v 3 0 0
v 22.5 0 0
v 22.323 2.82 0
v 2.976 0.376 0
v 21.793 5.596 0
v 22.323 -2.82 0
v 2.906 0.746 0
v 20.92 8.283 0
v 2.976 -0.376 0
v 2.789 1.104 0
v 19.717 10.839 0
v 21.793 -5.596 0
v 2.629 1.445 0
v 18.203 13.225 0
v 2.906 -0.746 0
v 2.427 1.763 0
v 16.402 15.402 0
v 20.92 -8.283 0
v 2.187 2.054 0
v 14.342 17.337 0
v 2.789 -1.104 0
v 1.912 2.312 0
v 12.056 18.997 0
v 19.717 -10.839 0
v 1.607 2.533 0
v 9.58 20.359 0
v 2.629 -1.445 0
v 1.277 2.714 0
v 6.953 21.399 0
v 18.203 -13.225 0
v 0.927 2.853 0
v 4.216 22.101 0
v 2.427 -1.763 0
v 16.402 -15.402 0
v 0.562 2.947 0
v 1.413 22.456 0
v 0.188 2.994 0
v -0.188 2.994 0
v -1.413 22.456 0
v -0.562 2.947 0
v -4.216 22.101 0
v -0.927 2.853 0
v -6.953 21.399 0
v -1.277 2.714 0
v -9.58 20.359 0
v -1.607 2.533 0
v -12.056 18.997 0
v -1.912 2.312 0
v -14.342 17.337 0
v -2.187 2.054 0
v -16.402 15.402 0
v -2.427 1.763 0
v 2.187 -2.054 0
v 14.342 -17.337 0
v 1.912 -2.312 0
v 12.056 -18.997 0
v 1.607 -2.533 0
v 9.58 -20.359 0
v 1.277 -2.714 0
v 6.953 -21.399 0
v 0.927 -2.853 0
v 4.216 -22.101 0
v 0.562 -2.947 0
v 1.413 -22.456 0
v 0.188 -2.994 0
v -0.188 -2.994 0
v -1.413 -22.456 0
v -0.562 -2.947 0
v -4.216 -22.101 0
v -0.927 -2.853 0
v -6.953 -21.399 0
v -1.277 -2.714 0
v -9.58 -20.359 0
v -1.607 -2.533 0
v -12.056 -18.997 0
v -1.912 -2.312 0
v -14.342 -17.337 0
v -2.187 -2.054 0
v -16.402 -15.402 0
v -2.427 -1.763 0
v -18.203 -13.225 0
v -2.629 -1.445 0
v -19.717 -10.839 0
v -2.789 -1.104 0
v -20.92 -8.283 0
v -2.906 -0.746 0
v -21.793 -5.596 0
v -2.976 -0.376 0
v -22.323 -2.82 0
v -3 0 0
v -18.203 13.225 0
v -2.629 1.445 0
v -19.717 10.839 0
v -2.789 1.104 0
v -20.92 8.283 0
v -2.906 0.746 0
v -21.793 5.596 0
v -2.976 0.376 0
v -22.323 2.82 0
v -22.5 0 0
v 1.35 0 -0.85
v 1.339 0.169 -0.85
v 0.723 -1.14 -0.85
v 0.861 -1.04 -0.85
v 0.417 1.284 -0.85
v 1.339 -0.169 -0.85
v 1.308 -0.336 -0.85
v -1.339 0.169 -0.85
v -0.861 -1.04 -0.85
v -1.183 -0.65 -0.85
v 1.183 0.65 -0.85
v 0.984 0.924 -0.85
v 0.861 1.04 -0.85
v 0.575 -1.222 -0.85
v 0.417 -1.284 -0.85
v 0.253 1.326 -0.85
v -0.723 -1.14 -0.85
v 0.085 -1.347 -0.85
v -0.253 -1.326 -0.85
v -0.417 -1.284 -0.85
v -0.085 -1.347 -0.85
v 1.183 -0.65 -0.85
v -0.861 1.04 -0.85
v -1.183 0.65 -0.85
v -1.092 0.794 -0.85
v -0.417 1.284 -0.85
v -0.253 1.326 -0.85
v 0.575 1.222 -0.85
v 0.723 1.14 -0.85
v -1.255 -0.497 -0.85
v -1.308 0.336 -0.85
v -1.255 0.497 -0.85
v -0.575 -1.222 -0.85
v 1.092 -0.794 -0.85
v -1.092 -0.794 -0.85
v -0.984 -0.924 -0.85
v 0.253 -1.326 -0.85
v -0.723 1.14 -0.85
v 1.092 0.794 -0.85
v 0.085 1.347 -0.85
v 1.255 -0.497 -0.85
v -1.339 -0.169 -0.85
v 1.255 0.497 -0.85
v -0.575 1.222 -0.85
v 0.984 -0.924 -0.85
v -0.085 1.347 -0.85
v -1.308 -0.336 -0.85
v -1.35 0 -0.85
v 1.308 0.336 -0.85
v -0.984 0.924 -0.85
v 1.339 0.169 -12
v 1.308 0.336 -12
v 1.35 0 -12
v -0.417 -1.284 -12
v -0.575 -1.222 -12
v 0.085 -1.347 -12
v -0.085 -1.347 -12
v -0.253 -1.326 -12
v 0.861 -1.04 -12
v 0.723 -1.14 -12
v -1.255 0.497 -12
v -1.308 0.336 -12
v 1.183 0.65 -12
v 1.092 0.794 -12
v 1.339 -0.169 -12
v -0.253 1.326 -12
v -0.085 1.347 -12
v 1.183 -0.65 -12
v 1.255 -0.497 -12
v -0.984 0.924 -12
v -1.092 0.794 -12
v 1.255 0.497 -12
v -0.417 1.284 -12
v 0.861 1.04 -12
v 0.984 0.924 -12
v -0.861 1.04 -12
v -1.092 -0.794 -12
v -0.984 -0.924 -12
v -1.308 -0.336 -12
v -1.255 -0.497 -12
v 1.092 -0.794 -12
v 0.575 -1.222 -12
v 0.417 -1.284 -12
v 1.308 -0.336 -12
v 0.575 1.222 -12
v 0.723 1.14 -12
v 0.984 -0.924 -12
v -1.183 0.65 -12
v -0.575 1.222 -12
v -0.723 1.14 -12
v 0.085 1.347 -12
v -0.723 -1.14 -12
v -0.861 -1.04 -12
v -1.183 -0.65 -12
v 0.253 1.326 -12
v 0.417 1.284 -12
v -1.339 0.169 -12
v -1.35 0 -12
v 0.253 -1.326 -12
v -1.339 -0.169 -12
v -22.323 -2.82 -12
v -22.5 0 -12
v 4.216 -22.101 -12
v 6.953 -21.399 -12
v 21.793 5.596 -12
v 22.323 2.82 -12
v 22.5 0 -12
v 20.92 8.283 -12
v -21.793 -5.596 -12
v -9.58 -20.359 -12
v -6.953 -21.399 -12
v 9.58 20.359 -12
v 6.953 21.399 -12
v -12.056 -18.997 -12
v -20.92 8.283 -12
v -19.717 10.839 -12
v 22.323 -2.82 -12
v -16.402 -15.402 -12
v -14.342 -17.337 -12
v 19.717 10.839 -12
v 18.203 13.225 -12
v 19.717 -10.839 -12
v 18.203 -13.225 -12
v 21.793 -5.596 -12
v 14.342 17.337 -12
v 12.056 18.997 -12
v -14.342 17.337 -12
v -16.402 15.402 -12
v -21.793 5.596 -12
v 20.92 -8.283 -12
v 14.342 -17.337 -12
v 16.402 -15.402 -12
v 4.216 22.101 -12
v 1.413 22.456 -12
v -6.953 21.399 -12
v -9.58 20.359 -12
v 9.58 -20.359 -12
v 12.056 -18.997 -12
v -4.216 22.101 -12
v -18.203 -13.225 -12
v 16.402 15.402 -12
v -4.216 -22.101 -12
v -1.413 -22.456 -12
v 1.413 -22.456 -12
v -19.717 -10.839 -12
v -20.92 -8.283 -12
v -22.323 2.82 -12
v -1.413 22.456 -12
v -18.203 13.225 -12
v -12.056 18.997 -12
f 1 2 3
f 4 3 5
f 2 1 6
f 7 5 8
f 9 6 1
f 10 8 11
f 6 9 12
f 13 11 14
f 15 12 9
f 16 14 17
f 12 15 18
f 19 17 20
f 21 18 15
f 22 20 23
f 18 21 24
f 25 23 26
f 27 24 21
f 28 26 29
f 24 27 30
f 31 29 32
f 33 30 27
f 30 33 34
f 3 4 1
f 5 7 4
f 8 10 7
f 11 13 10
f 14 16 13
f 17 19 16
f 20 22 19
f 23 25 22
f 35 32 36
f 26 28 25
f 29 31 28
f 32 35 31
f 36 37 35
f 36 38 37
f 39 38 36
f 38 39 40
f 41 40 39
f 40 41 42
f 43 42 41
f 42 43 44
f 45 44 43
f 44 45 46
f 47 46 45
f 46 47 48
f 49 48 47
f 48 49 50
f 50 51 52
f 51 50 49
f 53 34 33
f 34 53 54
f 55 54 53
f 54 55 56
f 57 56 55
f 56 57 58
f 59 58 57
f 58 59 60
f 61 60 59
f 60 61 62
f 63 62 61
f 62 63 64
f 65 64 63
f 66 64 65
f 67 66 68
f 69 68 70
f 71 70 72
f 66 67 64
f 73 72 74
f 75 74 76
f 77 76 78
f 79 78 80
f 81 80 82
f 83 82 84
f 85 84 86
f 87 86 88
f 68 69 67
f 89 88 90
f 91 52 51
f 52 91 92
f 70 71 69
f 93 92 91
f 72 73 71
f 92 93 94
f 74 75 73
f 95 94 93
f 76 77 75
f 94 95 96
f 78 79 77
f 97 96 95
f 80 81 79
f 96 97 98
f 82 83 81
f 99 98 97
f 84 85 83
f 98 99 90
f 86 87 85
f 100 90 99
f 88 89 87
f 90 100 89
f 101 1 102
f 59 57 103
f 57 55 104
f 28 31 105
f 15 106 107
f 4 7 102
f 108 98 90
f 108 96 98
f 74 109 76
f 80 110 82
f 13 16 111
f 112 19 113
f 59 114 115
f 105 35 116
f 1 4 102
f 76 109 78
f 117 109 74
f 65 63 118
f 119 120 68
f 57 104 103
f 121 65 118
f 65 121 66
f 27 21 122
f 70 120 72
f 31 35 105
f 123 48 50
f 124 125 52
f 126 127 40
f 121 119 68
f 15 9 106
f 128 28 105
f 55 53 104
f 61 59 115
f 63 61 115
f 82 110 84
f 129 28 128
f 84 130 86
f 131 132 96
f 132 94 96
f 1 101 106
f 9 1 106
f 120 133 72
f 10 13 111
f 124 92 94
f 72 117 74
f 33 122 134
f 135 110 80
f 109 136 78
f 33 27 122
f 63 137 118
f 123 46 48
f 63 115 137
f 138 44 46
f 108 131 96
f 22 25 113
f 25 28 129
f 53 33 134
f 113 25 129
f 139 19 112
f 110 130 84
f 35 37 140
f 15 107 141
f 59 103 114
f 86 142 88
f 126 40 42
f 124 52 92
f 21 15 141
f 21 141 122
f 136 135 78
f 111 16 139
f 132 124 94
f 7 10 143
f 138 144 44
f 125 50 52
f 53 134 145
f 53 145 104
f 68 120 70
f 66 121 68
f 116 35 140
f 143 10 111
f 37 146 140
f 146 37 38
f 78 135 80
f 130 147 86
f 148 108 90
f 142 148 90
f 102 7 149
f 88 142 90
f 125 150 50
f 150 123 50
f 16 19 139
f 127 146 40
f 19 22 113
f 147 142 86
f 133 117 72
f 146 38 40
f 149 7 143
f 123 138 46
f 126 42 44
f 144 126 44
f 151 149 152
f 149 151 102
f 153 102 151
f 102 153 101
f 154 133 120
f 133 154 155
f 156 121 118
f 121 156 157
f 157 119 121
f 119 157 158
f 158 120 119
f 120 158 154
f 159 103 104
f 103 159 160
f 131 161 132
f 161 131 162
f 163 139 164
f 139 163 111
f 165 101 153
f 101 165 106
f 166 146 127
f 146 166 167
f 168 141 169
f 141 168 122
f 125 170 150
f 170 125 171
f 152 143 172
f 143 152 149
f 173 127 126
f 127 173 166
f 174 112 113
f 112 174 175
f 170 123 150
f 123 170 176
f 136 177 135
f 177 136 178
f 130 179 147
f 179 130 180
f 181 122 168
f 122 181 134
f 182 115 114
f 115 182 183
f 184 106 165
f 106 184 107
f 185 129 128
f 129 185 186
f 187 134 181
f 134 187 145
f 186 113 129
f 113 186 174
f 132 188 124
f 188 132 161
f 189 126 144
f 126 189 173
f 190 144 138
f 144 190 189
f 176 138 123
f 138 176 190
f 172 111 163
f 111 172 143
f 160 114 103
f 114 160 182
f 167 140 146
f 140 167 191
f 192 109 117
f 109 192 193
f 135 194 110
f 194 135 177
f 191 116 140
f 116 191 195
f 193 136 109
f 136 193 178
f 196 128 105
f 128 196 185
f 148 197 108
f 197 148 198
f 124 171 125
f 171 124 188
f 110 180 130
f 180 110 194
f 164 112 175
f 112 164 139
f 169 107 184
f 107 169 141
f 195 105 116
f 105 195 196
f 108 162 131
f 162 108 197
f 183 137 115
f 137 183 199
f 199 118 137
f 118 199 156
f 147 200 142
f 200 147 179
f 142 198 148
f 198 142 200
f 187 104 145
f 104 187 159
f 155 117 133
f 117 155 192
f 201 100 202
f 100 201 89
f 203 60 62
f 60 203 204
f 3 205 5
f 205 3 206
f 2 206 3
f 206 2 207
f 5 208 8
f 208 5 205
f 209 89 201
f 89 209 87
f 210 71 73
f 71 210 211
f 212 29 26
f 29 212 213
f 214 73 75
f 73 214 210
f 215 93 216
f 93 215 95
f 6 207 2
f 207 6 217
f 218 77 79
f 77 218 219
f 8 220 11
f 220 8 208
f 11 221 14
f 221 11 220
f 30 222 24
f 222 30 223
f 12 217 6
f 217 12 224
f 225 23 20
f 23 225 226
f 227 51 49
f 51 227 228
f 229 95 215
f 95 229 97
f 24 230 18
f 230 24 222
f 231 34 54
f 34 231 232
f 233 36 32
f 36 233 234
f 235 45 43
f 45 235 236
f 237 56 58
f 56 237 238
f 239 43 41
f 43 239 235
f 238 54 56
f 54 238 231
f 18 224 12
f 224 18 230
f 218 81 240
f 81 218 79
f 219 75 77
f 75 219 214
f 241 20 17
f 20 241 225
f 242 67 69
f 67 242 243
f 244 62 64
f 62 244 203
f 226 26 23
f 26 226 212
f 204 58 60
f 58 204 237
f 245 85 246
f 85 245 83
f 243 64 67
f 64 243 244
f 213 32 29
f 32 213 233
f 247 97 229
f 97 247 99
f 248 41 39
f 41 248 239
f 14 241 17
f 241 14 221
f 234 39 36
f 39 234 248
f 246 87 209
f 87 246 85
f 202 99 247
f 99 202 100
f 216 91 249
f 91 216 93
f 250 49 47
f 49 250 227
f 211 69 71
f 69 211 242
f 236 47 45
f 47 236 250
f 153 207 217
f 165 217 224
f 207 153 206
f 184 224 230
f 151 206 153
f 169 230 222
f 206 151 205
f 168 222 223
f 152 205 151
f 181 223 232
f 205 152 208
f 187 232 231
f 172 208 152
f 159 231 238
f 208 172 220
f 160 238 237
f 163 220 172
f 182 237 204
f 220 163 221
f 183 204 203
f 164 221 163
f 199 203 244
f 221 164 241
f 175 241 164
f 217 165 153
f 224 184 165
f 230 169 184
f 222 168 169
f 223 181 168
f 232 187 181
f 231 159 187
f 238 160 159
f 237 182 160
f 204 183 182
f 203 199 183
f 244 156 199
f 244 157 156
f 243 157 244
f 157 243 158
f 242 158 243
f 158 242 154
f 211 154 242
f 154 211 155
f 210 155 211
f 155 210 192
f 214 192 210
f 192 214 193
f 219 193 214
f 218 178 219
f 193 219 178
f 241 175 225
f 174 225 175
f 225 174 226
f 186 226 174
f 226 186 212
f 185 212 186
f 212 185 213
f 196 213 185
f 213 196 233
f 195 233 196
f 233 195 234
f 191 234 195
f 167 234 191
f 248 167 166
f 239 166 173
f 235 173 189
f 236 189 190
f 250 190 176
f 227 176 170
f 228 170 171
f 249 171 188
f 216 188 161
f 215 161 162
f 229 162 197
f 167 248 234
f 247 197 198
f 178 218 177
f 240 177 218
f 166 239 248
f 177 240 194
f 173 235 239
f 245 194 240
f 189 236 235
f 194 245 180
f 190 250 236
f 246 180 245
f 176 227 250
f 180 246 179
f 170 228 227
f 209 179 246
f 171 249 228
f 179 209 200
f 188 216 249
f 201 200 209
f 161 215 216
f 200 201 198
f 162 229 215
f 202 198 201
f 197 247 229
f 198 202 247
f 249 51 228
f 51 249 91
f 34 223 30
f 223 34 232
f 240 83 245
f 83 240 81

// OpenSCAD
$fn = 50;

difference() {
	union() {
		translate(v = [0, 0, -12.0]) {
			cylinder(h = 12, r = 22.5);
		}
	}
	union() {
		translate(v = [0, 0, 0]) {
			rotate(a = [0, 0, 0]) {
				difference() {
					union() {
						translate(v = [0, 0, -15.0]) {
							cylinder(h = 15, r = 1.0);
						}
						translate(v = [0, 0, -0.85]) {
							cylinder(h = 0.85, r1 = 1.35, r2 = 3.0);
						}
						translate(v = [0, 0, -15.0]) {
							cylinder(h = 15, r = 1.35);
						}
						translate(v = [0, 0, -15.0]) {
							cylinder(h = 15, r = 1.0);
						}
					}
					union();
				}
			}
		}
	}
}
